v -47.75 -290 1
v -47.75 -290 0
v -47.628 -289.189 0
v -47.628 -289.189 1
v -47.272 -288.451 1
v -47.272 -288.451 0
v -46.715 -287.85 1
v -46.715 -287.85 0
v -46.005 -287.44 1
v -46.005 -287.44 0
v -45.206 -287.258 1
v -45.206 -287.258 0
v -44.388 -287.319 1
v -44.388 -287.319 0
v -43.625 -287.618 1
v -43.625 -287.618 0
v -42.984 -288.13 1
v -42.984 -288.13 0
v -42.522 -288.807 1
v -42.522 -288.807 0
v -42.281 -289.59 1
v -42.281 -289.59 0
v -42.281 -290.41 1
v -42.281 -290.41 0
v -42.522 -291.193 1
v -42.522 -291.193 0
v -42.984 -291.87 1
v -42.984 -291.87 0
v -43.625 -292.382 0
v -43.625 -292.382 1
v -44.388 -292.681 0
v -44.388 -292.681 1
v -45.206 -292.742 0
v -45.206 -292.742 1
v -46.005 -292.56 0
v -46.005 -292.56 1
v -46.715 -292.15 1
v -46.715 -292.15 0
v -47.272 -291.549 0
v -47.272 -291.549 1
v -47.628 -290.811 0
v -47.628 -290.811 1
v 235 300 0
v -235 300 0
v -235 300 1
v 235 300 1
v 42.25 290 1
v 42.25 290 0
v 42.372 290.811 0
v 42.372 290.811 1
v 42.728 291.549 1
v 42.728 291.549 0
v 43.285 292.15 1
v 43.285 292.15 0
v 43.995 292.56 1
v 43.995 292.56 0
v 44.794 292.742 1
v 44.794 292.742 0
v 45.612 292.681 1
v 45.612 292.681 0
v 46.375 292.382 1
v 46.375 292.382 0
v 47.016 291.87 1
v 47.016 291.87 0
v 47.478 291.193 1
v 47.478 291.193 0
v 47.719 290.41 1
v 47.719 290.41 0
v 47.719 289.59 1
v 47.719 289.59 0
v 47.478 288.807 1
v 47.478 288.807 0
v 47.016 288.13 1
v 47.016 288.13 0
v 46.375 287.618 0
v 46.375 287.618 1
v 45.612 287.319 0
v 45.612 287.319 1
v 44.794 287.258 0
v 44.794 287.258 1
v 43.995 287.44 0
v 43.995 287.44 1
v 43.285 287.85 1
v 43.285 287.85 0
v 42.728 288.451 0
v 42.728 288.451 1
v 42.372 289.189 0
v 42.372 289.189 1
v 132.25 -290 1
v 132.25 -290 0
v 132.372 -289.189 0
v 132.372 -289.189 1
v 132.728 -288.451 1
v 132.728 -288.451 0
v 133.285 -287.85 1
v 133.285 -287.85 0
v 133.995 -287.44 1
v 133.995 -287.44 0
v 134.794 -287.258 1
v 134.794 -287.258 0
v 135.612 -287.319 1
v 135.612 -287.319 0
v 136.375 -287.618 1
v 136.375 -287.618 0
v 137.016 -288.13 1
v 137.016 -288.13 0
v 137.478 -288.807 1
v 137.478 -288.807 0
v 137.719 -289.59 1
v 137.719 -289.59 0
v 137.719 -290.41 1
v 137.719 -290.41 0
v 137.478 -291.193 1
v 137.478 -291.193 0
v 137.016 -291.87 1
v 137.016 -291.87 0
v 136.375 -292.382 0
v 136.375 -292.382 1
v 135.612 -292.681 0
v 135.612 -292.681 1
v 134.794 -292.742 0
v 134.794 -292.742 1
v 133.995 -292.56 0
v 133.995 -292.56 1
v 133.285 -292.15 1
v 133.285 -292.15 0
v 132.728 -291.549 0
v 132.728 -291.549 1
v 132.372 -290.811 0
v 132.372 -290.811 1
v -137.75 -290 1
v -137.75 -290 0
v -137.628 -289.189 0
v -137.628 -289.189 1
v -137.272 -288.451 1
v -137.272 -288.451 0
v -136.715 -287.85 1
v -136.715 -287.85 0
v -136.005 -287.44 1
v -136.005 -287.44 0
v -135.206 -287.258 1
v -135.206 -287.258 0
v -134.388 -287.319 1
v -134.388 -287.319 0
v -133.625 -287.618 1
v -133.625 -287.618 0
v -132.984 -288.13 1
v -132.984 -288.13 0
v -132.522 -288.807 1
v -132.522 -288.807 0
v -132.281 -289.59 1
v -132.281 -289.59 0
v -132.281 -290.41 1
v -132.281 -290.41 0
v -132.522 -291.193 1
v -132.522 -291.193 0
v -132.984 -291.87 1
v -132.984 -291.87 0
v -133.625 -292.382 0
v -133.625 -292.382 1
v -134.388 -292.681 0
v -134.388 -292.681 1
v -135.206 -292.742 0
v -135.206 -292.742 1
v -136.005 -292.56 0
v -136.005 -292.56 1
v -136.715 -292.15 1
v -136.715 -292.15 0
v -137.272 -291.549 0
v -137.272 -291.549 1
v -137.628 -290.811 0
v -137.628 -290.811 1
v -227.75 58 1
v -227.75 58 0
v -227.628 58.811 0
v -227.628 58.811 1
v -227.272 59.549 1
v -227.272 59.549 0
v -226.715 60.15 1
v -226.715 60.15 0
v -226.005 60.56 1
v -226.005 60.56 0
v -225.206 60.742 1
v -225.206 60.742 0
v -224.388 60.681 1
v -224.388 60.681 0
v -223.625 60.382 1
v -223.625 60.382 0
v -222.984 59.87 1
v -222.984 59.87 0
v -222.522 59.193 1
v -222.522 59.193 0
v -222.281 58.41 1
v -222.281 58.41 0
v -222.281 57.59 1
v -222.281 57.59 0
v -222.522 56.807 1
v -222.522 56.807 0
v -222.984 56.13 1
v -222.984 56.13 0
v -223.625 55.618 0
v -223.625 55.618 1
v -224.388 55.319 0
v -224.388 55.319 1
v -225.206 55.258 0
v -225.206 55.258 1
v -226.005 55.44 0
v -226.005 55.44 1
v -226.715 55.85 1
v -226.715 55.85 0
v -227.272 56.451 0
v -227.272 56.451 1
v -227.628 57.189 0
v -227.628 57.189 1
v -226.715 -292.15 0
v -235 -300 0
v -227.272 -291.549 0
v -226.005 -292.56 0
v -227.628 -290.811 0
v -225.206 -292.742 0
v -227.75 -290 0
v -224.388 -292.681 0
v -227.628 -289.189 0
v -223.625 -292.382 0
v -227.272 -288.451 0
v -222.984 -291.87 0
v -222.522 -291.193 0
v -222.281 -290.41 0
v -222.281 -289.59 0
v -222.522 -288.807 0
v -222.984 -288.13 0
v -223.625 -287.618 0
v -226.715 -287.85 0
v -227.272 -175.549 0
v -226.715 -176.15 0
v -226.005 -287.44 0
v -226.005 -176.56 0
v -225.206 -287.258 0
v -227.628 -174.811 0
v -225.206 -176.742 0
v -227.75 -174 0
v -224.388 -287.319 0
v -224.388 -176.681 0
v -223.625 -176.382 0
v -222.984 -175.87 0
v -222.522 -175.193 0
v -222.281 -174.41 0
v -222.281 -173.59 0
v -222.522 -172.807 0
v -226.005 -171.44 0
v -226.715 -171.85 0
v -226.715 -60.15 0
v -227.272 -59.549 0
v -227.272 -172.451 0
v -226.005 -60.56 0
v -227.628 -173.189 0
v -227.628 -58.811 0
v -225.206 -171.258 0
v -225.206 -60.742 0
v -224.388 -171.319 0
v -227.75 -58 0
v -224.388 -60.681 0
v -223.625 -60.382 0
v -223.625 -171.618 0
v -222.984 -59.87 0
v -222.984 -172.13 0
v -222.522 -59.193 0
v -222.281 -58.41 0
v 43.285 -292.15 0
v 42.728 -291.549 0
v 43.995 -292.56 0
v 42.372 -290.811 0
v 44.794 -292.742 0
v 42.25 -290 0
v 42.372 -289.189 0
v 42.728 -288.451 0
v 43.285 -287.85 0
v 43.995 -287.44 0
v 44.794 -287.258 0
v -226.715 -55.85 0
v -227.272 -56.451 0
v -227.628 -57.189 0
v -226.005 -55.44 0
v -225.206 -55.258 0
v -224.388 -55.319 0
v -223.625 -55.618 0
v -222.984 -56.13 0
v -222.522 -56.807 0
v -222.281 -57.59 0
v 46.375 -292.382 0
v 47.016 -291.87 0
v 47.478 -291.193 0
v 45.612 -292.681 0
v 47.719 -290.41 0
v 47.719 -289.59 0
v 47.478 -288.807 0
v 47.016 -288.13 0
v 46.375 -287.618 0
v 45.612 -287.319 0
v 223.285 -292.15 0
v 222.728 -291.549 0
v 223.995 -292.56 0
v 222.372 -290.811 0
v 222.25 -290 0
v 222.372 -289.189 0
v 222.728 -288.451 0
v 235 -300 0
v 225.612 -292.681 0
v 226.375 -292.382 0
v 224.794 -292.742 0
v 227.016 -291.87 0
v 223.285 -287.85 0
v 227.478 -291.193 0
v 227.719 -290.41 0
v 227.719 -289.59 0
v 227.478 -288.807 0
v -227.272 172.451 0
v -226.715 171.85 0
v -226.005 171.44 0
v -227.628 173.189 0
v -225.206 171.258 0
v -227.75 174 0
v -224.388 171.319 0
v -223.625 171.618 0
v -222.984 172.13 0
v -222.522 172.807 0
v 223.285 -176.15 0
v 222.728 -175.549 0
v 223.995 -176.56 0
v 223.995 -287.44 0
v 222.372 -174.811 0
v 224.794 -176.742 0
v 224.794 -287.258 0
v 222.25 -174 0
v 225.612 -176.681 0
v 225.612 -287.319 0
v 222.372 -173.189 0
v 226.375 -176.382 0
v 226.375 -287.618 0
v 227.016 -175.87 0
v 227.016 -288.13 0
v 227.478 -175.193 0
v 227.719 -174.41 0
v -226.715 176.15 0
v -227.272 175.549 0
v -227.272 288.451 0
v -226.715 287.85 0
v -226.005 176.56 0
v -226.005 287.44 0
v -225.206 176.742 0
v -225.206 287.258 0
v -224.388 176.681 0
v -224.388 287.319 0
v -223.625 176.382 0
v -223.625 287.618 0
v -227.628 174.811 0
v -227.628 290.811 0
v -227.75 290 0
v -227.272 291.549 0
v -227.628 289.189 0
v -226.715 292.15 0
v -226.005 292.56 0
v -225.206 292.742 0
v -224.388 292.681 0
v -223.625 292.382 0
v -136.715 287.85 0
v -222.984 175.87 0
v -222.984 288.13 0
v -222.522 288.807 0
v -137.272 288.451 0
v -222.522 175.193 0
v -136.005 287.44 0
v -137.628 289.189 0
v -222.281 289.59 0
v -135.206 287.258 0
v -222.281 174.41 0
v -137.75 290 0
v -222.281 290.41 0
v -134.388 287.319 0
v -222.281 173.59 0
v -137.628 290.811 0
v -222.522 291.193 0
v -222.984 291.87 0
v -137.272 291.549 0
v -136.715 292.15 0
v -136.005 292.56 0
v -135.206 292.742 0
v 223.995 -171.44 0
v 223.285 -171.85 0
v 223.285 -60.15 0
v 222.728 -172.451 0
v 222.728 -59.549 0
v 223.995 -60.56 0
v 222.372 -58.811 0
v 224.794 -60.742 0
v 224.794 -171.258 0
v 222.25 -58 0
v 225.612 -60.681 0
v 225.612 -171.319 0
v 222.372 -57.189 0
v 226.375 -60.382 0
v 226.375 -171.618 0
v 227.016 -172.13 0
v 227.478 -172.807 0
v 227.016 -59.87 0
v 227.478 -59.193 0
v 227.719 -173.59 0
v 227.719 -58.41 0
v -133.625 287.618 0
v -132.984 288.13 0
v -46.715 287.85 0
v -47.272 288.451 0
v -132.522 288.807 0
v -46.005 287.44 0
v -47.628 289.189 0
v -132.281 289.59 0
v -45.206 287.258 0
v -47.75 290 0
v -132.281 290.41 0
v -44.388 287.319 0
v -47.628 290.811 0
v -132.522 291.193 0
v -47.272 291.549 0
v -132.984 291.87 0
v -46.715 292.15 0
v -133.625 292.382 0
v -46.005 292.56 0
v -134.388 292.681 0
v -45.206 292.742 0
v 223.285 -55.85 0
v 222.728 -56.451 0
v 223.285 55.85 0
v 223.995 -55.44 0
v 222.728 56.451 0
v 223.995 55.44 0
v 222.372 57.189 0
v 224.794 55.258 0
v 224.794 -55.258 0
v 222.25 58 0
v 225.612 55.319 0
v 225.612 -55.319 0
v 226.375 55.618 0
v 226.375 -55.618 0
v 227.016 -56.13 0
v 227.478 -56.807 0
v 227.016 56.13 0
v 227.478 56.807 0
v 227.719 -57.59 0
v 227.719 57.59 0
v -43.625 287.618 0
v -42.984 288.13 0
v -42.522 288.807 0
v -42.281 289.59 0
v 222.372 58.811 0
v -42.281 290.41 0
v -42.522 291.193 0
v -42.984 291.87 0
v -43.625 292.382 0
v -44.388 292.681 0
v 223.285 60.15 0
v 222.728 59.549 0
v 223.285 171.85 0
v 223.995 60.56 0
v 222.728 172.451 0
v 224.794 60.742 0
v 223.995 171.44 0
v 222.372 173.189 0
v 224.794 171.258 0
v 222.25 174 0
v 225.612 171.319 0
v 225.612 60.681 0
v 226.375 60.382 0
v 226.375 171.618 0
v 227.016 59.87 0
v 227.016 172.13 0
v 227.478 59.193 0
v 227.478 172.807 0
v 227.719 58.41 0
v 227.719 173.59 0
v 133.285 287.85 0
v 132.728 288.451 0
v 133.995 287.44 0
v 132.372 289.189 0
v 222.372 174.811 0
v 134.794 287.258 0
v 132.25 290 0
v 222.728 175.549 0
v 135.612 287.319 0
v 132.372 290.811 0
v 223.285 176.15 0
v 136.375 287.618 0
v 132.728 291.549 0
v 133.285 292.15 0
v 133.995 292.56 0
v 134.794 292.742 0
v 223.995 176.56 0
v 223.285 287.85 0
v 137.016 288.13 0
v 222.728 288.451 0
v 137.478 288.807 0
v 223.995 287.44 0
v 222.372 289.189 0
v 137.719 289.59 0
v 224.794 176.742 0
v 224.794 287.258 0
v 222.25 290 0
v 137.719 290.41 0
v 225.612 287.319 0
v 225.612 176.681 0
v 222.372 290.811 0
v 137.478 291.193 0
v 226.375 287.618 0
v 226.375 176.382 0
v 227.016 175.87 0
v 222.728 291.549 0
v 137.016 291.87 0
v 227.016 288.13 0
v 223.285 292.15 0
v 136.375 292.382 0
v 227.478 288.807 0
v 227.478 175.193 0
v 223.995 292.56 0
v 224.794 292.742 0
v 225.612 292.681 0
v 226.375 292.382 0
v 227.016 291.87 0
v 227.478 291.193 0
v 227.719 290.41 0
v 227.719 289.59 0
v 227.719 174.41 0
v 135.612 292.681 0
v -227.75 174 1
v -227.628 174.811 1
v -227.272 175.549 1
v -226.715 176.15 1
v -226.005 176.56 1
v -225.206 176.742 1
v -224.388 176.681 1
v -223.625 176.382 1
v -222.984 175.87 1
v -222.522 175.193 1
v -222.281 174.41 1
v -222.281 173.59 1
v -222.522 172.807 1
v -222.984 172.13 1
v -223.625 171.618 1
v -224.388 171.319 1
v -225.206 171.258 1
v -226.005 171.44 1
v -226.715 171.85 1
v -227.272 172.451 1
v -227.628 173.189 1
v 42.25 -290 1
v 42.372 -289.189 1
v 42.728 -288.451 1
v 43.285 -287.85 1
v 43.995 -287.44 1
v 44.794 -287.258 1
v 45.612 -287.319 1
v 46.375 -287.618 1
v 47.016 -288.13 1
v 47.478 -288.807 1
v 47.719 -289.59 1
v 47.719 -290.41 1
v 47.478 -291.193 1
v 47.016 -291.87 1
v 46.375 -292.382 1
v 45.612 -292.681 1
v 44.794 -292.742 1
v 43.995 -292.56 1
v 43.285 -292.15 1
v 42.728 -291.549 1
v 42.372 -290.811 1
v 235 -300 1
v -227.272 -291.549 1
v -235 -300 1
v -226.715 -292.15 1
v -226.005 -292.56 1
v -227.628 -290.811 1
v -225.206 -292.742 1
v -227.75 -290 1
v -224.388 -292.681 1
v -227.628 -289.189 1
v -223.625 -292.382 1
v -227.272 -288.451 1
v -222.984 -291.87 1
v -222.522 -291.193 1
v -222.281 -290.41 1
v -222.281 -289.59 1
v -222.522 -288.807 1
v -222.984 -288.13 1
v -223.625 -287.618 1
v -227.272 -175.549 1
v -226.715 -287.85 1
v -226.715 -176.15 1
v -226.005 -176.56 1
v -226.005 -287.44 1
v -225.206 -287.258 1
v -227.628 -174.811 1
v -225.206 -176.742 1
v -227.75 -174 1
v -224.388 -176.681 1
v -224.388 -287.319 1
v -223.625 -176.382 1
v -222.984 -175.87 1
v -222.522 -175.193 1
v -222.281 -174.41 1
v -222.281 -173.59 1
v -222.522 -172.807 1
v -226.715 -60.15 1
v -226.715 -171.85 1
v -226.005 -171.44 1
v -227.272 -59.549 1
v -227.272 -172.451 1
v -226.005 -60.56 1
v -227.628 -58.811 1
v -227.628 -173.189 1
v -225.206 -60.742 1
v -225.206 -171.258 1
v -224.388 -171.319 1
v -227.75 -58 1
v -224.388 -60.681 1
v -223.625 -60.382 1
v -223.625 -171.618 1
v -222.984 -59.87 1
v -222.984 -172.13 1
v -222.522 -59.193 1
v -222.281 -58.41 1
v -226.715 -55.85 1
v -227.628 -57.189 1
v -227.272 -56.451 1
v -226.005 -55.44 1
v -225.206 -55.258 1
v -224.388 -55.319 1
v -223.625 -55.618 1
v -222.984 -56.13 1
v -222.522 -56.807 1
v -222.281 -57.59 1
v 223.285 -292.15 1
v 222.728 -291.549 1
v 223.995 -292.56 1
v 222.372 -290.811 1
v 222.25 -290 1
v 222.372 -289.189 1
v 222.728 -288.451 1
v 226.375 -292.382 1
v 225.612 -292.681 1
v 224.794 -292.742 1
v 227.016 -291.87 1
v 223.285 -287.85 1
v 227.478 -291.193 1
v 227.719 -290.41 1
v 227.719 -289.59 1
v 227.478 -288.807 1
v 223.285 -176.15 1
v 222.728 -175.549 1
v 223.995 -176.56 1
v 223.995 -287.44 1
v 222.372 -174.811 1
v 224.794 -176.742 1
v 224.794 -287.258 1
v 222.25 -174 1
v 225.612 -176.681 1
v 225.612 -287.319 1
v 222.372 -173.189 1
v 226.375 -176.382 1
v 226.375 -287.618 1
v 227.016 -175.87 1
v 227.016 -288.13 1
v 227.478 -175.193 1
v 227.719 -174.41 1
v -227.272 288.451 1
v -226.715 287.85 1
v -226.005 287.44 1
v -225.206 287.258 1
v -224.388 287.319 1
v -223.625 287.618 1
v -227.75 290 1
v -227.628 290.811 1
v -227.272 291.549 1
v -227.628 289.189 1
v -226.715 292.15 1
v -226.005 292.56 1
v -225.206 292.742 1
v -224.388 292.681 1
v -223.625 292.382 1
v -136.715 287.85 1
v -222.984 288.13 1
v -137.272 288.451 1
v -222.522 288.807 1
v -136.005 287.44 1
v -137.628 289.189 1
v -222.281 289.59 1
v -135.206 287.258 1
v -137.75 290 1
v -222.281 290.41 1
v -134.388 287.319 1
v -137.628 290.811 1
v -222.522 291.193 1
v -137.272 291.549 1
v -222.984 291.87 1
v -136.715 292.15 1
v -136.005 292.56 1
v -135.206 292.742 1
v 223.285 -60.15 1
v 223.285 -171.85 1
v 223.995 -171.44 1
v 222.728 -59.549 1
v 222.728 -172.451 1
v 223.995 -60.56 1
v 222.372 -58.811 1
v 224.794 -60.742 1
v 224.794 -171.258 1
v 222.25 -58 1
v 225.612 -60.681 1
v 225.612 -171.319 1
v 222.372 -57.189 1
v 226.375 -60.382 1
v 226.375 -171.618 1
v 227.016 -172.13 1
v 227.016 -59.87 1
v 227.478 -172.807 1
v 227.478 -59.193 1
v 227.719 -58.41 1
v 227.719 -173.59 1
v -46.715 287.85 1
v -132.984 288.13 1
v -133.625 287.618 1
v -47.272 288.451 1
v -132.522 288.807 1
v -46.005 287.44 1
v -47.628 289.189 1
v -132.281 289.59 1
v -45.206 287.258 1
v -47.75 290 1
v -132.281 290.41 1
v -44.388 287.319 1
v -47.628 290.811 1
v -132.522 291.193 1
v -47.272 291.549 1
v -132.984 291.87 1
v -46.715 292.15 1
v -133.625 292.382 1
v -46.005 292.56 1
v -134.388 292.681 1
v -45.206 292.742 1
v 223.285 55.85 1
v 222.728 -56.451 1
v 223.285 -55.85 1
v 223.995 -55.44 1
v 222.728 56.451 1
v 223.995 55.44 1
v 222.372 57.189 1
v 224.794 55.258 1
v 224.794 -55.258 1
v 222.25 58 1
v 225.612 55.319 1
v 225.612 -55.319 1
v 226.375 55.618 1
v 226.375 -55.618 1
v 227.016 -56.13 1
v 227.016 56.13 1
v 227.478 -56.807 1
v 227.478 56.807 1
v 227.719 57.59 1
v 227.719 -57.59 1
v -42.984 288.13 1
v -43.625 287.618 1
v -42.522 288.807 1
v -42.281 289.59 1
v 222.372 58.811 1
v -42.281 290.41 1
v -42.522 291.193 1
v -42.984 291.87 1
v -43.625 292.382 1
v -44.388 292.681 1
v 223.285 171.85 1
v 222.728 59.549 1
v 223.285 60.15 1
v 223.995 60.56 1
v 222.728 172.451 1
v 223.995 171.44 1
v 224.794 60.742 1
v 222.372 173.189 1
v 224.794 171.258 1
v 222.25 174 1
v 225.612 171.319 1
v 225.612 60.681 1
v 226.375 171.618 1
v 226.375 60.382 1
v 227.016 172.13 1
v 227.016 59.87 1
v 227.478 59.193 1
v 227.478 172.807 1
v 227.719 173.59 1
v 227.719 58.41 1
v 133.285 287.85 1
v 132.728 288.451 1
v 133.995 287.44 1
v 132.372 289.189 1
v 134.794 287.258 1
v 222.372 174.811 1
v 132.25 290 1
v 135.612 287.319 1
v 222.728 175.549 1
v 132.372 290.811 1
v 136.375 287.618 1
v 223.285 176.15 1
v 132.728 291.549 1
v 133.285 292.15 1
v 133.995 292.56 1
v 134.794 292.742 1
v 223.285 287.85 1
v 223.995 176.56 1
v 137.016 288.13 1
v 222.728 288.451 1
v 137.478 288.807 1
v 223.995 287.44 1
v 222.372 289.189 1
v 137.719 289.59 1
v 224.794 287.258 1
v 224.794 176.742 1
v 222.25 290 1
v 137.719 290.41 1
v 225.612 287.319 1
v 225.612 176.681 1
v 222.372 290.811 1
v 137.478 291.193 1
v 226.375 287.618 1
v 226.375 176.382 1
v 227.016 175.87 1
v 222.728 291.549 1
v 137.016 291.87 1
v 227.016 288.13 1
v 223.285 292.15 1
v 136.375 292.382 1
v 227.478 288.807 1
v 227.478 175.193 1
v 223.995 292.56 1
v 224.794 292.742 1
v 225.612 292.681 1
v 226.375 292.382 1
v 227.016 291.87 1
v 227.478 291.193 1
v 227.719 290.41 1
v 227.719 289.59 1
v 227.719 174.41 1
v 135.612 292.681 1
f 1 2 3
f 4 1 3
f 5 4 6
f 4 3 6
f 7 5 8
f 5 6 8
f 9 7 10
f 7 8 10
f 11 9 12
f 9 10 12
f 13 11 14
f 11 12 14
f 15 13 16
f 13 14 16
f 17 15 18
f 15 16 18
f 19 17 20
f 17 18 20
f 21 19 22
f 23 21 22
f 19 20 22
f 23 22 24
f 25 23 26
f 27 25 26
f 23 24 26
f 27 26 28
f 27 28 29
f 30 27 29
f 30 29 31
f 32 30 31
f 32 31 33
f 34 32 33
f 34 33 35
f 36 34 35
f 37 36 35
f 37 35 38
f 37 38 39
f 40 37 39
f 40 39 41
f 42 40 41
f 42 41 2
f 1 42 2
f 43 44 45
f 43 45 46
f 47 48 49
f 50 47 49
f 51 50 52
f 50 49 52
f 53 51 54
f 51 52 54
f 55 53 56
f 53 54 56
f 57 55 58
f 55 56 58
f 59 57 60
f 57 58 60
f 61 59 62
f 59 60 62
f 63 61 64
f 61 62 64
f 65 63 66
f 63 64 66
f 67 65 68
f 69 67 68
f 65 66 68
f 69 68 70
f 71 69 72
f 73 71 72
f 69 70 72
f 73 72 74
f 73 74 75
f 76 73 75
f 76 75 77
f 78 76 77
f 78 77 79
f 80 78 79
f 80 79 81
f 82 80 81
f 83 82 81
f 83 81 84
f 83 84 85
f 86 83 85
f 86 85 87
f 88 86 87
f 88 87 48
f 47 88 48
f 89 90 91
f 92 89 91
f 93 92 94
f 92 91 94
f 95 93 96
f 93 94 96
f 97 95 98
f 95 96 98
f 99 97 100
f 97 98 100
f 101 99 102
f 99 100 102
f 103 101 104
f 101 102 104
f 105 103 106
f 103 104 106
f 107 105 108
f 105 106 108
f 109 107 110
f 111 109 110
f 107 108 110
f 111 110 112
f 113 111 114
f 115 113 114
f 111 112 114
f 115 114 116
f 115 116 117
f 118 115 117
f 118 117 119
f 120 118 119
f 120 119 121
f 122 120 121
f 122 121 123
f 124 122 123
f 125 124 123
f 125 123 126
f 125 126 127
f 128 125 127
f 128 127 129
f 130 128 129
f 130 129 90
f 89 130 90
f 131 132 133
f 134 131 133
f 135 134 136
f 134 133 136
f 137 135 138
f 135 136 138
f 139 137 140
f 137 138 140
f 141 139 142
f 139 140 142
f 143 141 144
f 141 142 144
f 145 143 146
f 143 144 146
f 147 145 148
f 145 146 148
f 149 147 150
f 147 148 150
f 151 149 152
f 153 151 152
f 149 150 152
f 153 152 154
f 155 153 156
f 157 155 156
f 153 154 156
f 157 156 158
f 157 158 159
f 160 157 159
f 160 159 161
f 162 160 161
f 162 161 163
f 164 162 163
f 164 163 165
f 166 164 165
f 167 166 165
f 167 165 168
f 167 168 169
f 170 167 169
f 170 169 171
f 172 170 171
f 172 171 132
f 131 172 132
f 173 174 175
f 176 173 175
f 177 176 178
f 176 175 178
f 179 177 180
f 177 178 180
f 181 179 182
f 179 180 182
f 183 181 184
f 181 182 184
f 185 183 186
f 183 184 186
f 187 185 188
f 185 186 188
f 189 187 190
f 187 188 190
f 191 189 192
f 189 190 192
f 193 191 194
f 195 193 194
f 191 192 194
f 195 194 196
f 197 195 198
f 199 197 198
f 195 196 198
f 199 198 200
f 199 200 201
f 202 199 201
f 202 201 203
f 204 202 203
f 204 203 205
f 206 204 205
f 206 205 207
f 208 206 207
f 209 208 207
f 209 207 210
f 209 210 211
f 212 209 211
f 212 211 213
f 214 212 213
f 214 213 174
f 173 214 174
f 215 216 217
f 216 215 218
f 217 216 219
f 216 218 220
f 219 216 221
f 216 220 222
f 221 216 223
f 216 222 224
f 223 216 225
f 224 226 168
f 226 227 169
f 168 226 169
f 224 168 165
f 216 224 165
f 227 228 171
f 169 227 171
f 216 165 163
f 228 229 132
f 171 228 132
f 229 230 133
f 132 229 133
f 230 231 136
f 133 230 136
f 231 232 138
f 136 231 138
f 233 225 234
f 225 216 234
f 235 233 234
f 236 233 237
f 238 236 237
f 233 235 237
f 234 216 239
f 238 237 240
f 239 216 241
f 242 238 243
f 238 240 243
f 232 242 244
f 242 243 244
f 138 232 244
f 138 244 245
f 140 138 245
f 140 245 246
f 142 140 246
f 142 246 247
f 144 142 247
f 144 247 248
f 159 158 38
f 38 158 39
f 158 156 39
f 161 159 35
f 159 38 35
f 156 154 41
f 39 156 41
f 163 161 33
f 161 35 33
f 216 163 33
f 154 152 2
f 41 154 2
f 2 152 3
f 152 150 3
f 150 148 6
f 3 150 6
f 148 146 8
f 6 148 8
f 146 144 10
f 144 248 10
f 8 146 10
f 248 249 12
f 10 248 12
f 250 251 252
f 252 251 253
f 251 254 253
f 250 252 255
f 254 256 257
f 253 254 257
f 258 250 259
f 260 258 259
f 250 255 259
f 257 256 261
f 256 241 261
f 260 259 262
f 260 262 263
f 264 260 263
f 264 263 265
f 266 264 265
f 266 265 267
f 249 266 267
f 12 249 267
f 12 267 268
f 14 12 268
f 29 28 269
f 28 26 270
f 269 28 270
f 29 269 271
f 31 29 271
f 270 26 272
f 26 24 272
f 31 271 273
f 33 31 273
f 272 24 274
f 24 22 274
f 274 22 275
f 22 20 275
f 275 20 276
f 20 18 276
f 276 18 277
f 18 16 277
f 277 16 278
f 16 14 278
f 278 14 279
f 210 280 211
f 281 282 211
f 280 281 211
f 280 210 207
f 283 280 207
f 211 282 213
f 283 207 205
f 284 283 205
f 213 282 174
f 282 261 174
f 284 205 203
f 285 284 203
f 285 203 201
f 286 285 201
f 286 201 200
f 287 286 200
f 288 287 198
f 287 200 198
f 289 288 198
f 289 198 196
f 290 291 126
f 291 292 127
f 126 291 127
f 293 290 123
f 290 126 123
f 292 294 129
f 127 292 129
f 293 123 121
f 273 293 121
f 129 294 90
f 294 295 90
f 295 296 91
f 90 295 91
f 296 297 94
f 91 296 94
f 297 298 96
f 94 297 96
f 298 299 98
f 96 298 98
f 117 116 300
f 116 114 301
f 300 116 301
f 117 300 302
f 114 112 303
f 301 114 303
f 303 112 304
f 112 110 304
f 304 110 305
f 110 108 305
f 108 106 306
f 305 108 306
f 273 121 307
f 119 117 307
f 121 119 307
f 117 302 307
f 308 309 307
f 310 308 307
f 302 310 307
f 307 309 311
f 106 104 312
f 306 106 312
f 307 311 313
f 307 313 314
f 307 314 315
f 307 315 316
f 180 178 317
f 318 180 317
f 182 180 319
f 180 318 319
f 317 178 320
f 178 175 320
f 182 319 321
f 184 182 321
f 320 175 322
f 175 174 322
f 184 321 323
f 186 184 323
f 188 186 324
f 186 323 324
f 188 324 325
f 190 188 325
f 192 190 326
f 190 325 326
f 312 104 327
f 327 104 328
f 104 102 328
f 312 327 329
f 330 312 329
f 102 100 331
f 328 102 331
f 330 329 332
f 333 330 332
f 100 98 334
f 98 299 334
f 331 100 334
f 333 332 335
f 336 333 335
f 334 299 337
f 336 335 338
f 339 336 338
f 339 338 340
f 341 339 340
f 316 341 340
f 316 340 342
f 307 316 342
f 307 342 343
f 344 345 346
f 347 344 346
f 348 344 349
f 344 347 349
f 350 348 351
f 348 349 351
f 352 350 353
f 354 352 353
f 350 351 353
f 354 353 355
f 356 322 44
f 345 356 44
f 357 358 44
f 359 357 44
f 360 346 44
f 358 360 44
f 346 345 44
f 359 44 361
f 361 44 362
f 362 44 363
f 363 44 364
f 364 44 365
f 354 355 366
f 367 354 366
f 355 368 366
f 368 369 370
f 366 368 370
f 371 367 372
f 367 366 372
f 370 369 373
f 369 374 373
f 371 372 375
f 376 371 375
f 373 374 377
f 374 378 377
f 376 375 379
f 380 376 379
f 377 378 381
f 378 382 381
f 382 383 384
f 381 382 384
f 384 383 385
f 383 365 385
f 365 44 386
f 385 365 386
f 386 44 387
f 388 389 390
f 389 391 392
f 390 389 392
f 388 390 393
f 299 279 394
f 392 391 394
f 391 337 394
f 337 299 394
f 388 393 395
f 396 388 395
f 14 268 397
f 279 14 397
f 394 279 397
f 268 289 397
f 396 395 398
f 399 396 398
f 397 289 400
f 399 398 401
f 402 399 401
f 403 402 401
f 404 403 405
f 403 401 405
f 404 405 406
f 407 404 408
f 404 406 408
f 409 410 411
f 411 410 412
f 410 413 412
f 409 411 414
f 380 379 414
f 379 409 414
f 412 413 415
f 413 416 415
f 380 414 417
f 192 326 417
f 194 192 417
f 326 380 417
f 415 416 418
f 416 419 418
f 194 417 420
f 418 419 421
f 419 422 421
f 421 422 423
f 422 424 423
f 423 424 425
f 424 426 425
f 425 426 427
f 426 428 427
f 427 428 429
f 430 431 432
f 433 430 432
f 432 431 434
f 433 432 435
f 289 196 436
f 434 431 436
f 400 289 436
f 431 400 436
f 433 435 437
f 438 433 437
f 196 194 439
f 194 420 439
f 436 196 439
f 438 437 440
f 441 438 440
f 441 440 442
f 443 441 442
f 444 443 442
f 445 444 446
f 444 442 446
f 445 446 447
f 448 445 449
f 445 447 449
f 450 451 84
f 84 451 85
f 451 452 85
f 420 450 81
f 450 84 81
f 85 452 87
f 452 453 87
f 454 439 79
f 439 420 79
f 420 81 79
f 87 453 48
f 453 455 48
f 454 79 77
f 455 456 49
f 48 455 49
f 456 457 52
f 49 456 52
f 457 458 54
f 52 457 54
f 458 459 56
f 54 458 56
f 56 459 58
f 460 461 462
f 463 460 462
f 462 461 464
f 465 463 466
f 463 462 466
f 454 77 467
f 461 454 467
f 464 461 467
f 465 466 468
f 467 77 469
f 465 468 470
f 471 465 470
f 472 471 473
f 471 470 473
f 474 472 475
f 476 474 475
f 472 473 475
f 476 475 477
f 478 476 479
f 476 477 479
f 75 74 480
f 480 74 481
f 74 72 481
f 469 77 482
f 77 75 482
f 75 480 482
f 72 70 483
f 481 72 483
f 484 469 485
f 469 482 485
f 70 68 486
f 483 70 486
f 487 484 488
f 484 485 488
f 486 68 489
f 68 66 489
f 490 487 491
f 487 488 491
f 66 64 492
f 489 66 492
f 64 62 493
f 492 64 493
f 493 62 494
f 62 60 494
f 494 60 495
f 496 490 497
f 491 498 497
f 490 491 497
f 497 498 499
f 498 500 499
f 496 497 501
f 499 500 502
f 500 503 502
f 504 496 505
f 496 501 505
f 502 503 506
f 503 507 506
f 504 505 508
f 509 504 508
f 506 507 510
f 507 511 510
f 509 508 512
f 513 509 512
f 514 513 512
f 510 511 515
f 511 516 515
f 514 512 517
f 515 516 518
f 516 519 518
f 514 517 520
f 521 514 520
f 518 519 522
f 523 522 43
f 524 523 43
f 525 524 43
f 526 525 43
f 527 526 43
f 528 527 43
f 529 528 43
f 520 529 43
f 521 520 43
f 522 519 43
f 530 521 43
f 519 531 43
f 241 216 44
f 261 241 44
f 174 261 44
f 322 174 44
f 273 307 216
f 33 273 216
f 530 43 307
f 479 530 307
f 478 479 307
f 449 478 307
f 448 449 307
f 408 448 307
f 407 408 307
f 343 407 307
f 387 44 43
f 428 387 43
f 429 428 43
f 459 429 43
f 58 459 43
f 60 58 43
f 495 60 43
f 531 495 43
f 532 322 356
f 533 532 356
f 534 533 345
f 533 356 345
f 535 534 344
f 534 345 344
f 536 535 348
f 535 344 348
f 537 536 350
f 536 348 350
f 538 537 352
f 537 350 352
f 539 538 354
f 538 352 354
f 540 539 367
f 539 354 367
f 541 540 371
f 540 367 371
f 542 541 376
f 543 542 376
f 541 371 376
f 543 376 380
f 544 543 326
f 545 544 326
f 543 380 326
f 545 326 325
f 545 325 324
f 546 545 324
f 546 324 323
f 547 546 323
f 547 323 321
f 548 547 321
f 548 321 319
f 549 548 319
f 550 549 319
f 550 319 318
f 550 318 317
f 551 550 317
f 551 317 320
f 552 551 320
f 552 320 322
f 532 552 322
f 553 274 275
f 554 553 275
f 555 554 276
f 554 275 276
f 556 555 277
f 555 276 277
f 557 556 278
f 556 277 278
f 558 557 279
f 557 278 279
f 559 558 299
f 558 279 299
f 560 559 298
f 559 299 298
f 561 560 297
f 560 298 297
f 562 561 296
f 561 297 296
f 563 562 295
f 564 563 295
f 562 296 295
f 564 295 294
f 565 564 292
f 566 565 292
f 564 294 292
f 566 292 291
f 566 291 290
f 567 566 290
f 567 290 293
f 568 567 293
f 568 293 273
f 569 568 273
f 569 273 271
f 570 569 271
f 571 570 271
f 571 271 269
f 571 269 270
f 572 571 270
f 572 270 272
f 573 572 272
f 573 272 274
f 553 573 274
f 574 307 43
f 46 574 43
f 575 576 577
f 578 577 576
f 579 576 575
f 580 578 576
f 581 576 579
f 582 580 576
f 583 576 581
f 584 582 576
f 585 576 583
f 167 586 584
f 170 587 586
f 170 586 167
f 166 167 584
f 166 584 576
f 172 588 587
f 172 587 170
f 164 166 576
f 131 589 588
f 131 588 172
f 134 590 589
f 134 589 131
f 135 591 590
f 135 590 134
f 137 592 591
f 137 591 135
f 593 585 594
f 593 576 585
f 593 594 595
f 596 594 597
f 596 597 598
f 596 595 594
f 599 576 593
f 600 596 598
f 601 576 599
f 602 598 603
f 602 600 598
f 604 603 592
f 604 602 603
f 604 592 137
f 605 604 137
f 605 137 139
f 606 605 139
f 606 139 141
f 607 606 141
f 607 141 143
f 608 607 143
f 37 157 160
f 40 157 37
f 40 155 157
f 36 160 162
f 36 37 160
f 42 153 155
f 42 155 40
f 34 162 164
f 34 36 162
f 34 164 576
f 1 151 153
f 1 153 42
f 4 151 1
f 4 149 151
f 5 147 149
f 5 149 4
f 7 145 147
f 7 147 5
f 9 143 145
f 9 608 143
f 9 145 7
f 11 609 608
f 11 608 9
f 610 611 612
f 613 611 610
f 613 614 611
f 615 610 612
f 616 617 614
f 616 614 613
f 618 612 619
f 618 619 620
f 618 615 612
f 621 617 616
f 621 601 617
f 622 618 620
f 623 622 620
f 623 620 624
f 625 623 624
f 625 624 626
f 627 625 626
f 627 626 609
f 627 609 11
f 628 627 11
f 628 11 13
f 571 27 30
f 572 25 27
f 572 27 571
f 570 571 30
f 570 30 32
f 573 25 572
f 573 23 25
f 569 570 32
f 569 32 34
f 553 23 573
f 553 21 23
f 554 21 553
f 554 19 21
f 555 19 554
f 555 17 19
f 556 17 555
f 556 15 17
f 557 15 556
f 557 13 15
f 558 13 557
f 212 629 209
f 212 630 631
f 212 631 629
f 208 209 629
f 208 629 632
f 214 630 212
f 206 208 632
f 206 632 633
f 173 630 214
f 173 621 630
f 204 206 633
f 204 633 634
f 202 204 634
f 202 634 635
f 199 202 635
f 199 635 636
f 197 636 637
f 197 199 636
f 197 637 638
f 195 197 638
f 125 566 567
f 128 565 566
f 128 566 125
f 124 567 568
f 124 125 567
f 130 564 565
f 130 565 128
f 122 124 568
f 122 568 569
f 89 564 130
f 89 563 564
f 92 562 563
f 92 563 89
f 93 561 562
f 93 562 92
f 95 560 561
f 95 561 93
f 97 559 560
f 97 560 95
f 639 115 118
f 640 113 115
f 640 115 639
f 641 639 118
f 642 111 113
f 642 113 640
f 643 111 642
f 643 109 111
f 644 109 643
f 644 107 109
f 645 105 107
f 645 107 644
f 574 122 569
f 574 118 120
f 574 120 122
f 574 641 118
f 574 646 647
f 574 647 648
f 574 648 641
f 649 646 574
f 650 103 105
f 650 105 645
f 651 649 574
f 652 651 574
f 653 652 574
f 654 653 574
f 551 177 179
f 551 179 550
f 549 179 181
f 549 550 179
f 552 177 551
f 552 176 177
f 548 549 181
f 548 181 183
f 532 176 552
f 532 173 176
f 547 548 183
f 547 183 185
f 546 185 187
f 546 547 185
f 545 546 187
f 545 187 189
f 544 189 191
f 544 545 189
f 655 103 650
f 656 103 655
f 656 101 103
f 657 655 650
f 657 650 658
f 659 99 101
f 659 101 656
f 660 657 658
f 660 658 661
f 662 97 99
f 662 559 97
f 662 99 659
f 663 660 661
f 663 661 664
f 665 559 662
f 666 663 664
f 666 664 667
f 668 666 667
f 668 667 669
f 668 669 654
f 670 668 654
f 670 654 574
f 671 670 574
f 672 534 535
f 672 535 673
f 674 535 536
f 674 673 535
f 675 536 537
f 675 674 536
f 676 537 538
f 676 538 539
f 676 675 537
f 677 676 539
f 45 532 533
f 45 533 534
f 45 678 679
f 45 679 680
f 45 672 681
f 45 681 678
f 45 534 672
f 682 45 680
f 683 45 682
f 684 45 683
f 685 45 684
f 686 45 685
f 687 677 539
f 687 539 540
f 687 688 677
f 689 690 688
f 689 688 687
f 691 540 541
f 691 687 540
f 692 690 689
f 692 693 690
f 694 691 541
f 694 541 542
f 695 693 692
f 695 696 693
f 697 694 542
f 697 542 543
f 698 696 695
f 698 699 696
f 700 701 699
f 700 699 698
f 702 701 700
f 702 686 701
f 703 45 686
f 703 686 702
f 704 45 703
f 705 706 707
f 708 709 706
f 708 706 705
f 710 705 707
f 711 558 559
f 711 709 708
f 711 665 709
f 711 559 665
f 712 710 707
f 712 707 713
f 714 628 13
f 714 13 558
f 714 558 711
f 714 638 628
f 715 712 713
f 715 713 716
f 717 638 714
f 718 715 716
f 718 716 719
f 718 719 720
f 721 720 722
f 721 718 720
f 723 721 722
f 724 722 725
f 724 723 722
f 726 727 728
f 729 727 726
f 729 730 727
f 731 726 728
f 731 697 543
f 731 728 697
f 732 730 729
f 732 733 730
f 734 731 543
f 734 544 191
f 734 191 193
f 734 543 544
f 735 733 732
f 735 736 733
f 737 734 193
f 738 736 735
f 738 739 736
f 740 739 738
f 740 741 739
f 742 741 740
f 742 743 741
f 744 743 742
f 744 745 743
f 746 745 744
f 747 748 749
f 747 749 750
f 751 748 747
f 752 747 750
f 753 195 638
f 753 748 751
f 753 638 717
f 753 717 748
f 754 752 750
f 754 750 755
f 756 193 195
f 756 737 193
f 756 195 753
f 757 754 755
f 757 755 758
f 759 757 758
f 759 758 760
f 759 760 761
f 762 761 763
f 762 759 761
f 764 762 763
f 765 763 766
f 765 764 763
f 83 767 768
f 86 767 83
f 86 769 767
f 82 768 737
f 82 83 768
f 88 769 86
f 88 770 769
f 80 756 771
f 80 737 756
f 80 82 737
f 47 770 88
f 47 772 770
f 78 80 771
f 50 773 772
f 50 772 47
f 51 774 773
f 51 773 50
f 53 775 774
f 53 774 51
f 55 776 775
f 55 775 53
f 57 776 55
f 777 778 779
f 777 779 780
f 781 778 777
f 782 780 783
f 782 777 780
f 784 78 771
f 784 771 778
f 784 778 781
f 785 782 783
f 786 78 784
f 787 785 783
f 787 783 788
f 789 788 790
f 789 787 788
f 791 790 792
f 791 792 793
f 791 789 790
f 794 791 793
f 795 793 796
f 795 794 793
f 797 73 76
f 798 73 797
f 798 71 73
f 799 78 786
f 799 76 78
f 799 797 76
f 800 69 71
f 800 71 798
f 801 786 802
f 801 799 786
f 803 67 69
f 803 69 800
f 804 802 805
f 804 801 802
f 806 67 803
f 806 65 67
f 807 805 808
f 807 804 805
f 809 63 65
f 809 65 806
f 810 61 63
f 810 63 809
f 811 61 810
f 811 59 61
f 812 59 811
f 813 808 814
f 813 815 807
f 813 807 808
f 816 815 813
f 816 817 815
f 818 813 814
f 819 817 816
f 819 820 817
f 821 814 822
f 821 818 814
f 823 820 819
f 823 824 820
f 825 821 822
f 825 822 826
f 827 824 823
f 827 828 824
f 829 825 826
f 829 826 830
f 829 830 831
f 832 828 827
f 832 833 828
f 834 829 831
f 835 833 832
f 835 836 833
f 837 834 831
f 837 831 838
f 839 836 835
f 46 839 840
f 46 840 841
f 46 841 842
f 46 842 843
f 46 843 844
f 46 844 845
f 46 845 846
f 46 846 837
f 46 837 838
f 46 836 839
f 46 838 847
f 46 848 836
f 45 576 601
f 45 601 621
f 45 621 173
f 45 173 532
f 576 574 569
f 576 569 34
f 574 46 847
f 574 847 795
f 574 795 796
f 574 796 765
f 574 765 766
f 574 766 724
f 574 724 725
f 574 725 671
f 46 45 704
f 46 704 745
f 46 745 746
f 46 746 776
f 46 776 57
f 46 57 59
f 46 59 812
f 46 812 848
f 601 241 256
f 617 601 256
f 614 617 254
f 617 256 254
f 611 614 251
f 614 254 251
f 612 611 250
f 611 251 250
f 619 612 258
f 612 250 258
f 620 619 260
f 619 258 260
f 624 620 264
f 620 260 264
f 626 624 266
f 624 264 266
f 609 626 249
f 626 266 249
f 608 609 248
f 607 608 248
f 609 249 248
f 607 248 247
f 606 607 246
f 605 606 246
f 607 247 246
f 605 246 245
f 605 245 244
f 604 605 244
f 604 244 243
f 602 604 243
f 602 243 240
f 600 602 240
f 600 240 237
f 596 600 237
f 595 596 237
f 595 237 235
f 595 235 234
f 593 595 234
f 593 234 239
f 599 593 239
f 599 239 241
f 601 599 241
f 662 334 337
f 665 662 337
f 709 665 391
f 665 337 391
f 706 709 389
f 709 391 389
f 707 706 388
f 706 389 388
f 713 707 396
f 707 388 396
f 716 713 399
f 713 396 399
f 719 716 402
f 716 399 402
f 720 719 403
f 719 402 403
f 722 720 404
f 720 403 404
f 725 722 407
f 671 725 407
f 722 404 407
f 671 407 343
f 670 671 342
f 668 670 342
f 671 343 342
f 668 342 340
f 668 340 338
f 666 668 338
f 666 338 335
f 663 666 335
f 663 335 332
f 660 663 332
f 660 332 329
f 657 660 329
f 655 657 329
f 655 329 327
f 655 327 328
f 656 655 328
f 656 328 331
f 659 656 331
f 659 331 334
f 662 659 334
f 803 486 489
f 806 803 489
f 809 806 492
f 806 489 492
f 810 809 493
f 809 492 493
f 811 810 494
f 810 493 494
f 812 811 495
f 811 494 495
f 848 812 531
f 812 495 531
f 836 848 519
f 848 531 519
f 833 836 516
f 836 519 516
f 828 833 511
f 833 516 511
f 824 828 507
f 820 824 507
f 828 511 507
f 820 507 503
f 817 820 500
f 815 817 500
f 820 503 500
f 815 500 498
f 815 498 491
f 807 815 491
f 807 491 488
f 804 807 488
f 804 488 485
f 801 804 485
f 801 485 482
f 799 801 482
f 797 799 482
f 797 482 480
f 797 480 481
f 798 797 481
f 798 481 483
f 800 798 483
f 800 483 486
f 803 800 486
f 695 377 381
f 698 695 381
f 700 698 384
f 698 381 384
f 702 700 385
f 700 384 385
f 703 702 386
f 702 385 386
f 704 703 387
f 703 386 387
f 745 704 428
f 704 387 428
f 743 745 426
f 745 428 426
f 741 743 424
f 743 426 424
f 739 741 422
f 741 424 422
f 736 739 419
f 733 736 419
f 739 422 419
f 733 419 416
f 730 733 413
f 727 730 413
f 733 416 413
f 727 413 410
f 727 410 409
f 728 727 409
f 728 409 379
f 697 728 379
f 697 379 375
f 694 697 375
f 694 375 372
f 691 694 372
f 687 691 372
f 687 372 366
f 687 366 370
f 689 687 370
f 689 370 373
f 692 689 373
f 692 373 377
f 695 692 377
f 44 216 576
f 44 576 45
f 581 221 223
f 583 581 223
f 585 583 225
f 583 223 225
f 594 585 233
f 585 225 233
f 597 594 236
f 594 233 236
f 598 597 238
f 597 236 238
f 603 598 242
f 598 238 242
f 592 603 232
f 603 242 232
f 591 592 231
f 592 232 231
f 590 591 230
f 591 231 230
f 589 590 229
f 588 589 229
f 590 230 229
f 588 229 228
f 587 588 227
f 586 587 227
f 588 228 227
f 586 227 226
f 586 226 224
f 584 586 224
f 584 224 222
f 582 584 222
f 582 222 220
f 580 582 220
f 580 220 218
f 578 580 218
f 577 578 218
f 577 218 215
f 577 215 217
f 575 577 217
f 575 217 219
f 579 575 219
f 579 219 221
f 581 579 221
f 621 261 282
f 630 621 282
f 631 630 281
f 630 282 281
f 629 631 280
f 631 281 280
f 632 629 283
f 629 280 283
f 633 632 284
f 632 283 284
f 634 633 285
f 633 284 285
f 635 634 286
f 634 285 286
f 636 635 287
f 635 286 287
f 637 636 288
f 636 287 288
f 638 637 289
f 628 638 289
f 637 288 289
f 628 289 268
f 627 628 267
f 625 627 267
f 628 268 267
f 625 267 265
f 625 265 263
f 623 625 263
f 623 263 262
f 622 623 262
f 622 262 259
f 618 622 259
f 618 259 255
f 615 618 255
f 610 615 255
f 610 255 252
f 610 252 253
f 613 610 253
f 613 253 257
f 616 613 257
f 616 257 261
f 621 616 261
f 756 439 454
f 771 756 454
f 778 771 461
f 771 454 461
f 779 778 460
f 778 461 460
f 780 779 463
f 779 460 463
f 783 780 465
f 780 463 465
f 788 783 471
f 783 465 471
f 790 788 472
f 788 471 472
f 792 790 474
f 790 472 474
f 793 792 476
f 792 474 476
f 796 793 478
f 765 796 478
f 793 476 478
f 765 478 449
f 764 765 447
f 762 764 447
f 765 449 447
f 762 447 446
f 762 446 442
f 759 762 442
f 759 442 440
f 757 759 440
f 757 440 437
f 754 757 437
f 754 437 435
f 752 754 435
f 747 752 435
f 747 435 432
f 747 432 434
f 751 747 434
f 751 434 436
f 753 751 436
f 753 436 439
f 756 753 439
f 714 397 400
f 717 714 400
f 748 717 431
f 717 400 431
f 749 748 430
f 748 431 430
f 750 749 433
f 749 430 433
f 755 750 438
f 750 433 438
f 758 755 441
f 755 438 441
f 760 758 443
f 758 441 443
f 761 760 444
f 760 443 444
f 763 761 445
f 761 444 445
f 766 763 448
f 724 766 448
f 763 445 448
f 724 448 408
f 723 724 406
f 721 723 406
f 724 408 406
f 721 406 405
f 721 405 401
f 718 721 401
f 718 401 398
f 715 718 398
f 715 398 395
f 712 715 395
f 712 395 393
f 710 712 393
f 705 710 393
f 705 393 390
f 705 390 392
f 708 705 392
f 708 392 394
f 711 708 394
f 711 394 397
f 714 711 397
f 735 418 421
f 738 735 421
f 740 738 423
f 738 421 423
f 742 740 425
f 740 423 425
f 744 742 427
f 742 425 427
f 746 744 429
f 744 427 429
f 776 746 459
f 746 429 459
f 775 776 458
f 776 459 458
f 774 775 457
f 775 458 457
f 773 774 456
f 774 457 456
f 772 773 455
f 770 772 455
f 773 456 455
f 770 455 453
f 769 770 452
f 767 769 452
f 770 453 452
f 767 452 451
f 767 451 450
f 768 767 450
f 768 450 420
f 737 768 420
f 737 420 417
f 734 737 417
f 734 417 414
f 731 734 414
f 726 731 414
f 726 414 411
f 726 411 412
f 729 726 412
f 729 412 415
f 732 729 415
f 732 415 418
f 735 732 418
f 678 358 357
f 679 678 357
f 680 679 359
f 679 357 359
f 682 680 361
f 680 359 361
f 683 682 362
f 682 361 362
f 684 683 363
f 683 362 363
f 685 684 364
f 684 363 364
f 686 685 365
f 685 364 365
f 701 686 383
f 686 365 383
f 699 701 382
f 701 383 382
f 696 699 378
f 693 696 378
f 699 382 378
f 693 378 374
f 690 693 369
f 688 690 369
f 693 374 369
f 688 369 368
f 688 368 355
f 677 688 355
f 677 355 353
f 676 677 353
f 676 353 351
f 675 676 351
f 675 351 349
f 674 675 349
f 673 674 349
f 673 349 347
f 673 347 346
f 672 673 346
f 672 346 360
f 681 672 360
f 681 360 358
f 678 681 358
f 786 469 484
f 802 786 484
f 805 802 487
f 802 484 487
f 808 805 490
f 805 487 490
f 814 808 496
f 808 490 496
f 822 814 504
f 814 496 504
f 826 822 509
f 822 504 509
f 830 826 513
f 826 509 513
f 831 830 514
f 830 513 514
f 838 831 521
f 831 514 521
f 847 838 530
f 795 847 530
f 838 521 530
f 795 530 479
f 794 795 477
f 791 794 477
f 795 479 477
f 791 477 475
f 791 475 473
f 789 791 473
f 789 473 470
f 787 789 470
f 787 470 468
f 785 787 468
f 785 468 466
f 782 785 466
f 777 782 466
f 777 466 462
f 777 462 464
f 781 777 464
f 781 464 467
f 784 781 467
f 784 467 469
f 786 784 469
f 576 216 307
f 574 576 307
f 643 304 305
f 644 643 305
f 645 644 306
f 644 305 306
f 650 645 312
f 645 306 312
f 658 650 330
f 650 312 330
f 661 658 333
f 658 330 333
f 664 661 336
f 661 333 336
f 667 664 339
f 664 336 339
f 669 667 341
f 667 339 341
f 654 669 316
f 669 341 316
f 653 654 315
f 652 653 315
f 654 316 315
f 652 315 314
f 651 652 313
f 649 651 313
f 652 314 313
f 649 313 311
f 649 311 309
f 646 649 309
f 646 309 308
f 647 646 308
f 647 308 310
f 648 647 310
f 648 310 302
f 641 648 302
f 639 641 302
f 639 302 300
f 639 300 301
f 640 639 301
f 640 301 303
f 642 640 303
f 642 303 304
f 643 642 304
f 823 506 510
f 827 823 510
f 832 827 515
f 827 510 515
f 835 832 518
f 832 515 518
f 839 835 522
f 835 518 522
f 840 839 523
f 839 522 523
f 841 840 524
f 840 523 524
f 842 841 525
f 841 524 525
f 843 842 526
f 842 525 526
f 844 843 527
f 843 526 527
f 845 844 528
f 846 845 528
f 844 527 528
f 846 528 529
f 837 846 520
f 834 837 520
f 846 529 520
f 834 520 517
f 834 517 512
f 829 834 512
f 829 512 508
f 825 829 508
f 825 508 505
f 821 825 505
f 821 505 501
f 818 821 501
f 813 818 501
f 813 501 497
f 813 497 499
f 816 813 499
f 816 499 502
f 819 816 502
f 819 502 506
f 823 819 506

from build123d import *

# Parameters (mm, degrees)
SKETCH_1_W         = 470
SKETCH_1_H         = 600
EXTRUDE_1_DEPTH    = 1
HOLE_WIZARD_M5_1_D = 5.5


with BuildPart() as part:
    # 스케치1 → 보스-돌출1 (new body)
    with BuildSketch(Plane.XY):
        Rectangle(SKETCH_1_W, SKETCH_1_H)
    extrude(amount=EXTRUDE_1_DEPTH)

    # M5 여유 구멍1 (through all)
    with Locations(Plane.XY.offset(1)):
        with Locations((-225, 290), (-135, 290), (-45, 290), (45, 290), (135, 290), (225, 290), (225, 174), (225, 58), (225, -58), (225, -174), (225, -290), (135, -290), (45, -290), (-45, -290), (-135, -290), (-225, -290), (-225, -174), (-225, -58), (-225, 174), (-225, 58)):
            Hole(HOLE_WIZARD_M5_1_D / 2)


solid = part.part
